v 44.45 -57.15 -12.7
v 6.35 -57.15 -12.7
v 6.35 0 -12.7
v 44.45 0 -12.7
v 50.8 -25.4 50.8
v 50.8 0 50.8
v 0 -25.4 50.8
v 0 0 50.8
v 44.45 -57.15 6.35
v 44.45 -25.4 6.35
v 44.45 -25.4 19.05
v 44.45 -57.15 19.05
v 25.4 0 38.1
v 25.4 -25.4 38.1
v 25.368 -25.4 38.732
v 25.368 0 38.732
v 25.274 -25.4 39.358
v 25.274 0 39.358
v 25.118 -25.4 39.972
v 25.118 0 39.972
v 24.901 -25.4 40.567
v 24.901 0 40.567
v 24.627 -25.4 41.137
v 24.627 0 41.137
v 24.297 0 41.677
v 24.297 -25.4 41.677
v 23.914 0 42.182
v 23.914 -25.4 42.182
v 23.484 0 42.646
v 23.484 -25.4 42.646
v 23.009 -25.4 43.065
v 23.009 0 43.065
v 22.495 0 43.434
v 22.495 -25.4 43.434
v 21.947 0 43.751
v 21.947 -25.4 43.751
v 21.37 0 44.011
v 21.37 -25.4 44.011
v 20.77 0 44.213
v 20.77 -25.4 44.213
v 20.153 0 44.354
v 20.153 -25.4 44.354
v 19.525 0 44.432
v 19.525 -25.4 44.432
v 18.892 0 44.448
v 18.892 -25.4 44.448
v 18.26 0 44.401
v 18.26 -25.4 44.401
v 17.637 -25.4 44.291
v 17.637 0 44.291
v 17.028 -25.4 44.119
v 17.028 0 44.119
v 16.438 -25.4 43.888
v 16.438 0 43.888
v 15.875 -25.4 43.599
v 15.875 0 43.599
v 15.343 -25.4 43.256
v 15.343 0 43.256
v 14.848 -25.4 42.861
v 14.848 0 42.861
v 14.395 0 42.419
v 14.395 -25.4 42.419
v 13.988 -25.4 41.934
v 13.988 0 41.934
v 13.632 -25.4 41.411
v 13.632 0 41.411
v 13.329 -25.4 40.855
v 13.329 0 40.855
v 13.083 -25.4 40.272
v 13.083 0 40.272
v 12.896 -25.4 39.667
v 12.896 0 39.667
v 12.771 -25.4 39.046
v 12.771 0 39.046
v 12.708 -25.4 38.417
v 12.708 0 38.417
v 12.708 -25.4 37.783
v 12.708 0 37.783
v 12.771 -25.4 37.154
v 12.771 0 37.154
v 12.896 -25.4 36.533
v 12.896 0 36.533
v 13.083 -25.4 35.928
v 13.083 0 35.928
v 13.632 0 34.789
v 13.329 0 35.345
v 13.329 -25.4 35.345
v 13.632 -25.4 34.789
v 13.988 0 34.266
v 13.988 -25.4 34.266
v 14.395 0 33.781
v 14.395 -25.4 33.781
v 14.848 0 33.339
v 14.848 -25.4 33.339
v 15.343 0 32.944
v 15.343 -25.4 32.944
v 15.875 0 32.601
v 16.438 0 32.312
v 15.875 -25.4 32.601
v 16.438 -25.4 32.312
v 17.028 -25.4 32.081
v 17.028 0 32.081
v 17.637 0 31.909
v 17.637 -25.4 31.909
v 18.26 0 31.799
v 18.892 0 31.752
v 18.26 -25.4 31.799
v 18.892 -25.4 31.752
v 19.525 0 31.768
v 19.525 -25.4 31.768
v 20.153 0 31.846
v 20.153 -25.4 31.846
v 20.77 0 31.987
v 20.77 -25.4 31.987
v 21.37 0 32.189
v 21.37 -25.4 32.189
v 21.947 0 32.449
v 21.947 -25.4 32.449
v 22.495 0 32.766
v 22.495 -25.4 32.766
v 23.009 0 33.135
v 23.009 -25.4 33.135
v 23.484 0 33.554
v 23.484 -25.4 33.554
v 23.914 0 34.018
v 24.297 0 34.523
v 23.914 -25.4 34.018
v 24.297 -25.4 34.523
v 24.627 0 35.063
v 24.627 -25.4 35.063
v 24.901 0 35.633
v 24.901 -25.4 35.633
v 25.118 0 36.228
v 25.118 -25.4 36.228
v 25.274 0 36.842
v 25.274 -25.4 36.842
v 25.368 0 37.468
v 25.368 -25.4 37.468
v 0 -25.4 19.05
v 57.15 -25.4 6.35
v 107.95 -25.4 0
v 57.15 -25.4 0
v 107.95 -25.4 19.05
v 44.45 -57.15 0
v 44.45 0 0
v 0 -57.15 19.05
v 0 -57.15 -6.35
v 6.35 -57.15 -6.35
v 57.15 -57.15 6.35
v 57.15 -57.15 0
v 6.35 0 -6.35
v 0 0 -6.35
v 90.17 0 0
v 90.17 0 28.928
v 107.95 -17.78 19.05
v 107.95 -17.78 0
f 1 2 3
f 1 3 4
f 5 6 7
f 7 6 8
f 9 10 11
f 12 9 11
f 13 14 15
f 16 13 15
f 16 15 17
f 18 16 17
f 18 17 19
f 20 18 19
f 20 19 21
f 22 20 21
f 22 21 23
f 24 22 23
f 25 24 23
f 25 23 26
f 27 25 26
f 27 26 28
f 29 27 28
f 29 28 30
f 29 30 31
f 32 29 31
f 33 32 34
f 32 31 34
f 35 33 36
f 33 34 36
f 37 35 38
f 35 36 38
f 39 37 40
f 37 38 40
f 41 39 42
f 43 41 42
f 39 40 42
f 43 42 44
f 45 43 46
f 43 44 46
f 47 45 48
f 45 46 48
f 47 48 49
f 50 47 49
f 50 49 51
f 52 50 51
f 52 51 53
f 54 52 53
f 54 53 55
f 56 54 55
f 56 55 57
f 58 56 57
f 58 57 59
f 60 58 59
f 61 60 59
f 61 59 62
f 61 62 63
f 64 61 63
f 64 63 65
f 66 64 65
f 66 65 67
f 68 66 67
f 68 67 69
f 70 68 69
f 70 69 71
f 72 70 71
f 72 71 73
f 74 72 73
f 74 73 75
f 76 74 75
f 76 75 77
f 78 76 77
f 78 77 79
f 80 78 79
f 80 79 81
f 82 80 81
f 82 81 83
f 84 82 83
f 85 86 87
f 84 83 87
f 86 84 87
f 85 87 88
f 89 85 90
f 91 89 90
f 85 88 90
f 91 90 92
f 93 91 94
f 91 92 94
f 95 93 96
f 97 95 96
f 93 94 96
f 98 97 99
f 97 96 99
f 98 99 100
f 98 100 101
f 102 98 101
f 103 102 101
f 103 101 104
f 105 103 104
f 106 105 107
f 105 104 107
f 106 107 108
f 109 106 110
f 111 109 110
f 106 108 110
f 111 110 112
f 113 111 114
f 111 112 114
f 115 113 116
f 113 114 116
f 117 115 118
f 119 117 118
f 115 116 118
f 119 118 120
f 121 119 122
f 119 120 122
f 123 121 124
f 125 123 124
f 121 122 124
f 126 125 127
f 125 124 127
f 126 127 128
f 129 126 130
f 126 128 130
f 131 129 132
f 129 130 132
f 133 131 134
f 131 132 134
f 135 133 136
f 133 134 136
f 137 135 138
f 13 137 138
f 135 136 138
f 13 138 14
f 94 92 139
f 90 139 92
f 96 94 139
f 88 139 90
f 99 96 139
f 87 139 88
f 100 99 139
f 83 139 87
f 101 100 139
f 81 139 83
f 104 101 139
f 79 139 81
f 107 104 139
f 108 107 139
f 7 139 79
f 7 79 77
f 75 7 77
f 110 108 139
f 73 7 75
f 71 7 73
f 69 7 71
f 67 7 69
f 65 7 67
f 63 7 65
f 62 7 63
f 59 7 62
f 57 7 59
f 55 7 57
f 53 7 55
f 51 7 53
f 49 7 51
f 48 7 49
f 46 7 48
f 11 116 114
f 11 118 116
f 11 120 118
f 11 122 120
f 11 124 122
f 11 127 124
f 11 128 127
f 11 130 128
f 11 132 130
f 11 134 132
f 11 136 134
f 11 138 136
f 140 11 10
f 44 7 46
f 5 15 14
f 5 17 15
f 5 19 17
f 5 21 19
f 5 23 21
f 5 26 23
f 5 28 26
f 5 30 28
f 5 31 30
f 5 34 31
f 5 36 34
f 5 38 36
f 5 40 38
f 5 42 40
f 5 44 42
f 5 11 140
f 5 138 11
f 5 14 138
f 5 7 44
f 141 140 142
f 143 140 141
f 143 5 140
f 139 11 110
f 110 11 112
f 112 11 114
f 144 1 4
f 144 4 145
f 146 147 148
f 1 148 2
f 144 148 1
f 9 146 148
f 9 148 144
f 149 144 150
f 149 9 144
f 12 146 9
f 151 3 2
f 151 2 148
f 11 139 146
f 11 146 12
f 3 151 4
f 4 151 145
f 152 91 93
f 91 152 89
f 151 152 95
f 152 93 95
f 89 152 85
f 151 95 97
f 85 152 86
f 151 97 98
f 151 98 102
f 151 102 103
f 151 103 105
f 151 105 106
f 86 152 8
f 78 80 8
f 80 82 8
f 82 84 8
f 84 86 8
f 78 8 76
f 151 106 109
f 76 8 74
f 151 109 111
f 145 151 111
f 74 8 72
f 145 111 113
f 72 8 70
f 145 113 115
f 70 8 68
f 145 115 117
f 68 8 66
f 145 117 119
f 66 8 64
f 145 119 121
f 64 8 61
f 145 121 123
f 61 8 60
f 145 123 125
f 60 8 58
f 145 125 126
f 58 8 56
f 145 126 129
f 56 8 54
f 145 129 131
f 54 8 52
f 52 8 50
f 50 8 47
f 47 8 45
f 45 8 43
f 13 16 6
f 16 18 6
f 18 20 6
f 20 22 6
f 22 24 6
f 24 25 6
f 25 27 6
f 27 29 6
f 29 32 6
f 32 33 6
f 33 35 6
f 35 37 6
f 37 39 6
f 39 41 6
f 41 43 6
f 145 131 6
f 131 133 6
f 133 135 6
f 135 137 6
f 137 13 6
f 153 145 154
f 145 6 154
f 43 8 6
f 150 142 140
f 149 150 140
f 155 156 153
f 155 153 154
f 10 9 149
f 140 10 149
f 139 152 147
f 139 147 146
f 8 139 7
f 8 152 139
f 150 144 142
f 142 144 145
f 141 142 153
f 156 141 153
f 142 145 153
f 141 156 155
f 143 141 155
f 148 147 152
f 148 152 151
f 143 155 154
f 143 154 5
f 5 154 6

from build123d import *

# Parameters (mm, degrees)
F1_DEPTH  = 25.4
F2_W      = 57.15
F2_H      = 31.75
F3_DEPTH  = 57.15
F4_W      = 6.35
F4_H      = 6.35
F5_DEPTH  = 57.151
F4_W_2    = 12.7
F4_H_2    = 12.7
F6_DEPTH  = 31.75
F6_FACE_W = 12.7
F6_FACE_H = 12.7
F7_DEPTH  = 25.401
F8_R      = 6.35
F9_DEPTH  = 25.401
F10_SIZE  = 17.78


with BuildPart() as f1:
    # F0 (on Front) → F1 (new body)
    with BuildSketch(Plane.XZ):
        Polygon((0, 50.8), (0, 0), (107.95, 0), (107.95, 19.05), (50.8, 50.8), align=None)
    extrude(amount=F1_DEPTH)

    # F2 (on Front) → F3 (join)
    with BuildSketch(Plane.XZ):
        with Locations((28.575, 3.175)):
            Rectangle(F2_W, F2_H)
    extrude(amount=F3_DEPTH)

    # F4 (on face) → F5 (cut, through all)
    with BuildSketch(Plane.XZ.offset(57.15)):
        with Locations((3.175, -9.525)):
            Rectangle(F4_W, F4_H)
    extrude(amount=-F5_DEPTH, mode=Mode.SUBTRACT)

    # F4 (on face) → F6 (cut)
    with BuildSketch(Plane.XZ.offset(57.15)):
        with Locations((50.8, 12.7)):
            Rectangle(F4_W_2, F4_H_2)
        with Locations((50.8, -6.35)):
            Rectangle(F4_W_2, F4_H_2)
    extrude(amount=-F6_DEPTH, mode=Mode.SUBTRACT)

    # F6_face (on face) → F7 (cut, through all)
    with BuildSketch(Plane(origin=(50.8, -25.4, -6.35), x_dir=(1, 0, 0), z_dir=(0, -1, 0))):
        Rectangle(F6_FACE_W, F6_FACE_H)
    extrude(amount=-F7_DEPTH, mode=Mode.SUBTRACT)

    # F8 (on face) → F9 (cut, through all)
    with BuildSketch(Plane.XZ.offset(25.4)):
        with Locations((19.05, 38.1)):
            Circle(F8_R)
    extrude(amount=-F9_DEPTH, mode=Mode.SUBTRACT)

    # F10
    f10_edges = [f1.edges().sort_by_distance(p)[0] for p in [
        (107.95, 0, 9.525),
    ]]
    chamfer(f10_edges, length=F10_SIZE)


solid = f1.part
